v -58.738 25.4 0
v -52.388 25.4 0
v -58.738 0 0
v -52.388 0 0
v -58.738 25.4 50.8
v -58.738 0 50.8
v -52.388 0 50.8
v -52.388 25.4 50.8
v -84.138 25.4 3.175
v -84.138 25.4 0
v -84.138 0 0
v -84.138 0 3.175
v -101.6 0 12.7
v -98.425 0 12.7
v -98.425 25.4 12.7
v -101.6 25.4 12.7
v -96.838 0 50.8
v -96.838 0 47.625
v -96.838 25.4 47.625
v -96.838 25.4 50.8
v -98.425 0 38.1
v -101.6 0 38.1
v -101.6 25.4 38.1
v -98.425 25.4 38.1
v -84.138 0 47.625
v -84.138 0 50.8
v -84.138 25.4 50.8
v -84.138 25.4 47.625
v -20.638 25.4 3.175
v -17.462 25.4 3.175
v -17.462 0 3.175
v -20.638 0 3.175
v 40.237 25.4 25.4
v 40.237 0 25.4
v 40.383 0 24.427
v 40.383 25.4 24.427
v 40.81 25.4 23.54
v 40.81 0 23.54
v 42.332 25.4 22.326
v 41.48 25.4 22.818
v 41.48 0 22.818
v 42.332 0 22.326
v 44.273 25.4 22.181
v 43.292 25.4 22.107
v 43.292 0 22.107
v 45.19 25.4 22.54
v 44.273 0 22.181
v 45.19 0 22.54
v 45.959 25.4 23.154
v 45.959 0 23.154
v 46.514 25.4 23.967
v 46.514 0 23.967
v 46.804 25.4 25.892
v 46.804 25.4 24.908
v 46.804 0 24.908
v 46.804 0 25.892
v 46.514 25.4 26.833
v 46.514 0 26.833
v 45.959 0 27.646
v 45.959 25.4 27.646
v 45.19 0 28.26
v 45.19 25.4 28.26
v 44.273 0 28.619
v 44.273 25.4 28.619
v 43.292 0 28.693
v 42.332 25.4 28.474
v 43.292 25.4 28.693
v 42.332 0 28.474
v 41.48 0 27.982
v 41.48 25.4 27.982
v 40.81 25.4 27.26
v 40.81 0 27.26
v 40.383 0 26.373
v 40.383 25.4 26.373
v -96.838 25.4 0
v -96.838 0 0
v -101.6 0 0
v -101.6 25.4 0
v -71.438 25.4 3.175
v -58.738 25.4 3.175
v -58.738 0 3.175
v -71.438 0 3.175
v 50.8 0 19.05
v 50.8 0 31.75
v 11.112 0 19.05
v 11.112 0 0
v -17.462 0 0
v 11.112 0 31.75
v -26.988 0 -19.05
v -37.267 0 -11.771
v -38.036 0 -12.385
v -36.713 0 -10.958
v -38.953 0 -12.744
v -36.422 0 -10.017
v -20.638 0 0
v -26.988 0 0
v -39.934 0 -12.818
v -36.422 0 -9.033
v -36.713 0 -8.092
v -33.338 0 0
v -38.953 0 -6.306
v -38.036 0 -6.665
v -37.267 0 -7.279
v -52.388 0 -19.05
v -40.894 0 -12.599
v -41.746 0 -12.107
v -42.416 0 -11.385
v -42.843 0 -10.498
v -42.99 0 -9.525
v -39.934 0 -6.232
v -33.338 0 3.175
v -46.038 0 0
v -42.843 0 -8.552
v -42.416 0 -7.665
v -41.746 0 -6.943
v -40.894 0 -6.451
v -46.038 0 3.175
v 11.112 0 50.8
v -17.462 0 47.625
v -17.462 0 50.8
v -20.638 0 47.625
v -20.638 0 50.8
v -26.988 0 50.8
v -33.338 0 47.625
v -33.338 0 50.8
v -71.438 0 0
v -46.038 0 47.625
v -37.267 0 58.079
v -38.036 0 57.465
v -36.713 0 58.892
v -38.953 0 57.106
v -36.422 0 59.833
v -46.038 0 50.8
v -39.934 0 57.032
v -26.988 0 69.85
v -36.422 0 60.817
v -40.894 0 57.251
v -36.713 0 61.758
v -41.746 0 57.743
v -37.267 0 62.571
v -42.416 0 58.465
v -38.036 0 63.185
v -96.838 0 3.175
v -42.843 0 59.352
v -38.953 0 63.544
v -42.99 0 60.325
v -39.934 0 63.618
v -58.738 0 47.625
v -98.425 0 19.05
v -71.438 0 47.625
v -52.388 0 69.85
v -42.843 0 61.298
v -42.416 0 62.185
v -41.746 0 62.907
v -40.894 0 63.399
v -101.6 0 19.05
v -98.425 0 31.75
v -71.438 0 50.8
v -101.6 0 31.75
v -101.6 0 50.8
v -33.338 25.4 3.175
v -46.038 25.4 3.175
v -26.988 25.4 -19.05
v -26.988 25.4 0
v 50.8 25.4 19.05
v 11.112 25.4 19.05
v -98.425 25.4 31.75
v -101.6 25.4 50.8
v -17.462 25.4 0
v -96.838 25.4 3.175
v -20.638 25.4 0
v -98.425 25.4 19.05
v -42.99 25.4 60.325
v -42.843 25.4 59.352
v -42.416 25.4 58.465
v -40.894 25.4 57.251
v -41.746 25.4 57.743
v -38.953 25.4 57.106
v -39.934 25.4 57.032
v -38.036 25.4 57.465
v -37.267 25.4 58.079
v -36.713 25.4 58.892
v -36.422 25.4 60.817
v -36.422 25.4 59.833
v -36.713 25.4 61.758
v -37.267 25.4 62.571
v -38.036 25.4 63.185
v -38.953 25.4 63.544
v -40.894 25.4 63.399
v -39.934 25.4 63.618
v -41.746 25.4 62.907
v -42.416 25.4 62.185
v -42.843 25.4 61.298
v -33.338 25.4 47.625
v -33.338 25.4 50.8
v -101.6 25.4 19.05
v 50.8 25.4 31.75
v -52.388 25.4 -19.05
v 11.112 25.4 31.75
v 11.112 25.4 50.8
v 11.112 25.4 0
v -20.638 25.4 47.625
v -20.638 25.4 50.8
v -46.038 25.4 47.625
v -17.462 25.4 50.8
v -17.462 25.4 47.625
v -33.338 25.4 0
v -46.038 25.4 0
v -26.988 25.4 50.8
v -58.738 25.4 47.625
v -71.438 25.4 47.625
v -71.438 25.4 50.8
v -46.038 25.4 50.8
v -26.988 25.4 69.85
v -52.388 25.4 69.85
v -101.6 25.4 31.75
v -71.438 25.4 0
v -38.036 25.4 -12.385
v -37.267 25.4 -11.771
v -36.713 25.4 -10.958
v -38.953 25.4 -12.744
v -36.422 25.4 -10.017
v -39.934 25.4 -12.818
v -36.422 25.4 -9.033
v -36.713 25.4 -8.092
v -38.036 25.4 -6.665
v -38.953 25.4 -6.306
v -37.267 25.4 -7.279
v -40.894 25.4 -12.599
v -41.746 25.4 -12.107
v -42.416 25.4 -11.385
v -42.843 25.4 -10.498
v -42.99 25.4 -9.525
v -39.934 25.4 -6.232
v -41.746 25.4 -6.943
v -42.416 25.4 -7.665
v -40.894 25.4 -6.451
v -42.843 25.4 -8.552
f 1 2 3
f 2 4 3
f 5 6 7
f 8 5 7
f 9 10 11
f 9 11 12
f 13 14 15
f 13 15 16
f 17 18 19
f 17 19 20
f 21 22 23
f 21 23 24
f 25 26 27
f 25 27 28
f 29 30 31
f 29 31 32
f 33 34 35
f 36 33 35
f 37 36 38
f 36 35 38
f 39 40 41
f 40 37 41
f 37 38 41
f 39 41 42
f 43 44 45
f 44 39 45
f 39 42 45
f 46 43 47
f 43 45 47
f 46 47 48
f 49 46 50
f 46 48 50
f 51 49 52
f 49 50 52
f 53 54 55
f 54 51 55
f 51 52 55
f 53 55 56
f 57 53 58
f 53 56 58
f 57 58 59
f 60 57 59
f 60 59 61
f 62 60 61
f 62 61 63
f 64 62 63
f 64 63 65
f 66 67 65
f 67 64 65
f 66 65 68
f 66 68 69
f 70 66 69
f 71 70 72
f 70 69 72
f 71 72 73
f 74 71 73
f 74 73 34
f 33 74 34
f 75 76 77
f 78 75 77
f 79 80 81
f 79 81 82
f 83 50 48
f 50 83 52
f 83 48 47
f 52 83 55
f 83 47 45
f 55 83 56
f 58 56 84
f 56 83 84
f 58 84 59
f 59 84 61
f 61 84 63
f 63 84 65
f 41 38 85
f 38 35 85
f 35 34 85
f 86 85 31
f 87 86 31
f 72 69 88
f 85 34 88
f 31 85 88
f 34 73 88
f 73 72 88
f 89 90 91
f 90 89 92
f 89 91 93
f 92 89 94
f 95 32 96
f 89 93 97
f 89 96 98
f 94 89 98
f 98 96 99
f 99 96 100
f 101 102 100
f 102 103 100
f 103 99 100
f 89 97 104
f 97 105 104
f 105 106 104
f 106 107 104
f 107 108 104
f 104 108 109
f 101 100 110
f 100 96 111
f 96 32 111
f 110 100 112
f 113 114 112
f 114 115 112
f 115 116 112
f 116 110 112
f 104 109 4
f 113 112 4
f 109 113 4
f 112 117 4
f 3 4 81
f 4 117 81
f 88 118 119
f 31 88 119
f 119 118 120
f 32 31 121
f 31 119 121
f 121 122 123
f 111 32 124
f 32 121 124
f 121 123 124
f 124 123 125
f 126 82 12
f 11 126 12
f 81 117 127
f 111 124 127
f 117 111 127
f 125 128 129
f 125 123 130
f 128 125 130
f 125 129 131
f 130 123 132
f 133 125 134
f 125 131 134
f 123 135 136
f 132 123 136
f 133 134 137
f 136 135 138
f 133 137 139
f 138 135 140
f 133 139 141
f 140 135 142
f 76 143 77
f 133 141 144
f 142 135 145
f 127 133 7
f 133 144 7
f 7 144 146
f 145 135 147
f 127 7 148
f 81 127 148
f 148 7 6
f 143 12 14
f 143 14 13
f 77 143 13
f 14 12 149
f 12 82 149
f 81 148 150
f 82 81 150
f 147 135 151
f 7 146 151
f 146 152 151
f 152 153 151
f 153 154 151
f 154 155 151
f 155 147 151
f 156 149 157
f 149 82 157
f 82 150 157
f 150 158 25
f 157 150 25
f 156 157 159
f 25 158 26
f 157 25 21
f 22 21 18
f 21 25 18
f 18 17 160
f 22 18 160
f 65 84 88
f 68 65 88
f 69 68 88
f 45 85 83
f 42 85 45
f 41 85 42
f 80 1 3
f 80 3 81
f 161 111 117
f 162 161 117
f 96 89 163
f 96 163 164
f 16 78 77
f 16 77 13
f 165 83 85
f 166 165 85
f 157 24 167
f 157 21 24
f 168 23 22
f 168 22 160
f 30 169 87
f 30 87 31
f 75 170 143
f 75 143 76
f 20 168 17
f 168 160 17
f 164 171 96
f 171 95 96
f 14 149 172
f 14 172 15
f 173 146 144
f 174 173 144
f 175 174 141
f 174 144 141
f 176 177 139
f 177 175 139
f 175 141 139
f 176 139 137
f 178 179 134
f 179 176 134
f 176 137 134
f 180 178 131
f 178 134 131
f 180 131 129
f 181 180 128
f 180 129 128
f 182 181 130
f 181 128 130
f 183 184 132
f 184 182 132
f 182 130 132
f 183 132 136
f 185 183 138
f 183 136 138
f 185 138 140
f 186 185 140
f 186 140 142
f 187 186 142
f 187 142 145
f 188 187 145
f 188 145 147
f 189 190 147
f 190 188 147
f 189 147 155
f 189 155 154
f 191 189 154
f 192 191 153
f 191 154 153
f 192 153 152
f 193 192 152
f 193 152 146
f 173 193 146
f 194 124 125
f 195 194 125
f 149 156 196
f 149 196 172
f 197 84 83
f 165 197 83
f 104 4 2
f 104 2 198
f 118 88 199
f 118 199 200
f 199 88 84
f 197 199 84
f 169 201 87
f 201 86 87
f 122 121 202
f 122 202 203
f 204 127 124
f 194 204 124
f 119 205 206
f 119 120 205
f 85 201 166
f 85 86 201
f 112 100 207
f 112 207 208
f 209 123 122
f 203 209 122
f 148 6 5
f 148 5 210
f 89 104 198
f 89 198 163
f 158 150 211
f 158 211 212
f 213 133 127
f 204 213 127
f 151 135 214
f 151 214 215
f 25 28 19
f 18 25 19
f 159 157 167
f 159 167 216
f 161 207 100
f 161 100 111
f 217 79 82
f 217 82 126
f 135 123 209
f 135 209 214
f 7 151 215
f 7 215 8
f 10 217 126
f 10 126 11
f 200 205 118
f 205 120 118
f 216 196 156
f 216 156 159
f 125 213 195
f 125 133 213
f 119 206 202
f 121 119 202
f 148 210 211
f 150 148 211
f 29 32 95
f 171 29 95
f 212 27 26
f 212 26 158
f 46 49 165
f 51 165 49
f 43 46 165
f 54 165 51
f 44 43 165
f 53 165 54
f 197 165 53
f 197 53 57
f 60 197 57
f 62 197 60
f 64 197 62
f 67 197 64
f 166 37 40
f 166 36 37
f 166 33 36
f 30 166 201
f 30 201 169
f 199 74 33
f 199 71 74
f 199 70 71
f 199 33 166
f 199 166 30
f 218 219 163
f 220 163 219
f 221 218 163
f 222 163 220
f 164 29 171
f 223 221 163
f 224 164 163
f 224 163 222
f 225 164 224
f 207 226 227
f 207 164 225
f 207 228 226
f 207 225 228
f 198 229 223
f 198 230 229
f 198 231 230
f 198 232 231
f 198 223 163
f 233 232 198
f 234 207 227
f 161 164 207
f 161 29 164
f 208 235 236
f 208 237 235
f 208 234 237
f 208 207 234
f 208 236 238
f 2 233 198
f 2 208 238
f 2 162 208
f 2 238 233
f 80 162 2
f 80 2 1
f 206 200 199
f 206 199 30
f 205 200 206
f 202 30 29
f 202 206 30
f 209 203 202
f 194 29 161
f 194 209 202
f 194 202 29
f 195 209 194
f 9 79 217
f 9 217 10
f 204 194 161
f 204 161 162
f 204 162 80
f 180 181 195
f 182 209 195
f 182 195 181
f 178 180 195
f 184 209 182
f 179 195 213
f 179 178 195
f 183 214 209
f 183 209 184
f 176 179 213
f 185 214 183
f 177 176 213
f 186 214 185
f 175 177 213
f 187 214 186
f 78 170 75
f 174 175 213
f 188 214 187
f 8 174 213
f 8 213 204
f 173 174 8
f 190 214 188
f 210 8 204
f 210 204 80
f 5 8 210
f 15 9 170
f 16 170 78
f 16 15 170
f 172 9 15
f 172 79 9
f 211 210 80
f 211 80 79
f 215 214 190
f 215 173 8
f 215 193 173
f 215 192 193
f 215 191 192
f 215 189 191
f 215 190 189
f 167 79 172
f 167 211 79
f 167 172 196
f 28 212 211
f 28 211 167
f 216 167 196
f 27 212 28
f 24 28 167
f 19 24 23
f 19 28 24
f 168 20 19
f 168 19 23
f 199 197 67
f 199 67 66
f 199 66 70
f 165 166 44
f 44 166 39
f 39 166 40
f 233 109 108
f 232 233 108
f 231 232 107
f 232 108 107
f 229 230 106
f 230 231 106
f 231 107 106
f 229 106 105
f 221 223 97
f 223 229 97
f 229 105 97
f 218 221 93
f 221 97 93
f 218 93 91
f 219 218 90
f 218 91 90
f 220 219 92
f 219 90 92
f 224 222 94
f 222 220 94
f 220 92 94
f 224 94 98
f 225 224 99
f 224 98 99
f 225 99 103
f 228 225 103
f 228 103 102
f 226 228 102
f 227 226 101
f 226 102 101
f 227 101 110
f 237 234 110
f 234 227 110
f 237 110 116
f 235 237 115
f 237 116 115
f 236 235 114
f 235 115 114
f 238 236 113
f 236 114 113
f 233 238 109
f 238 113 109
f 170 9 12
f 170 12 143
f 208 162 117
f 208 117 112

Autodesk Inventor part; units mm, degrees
ref_plane "YZ Plane" through (0, 0, 0) normal (1, 0, 0) x (0, 1, 0)
ref_plane "XZ Plane" through (0, 0, 0) normal (0, 1, 0) x (-1, 0, 0)
ref_plane "XY Plane" through (0, 0, 0) normal (0, 0, 1) x (1, 0, 0)
sketch "Sketch1" plane through (0, 0, 0) normal (0, 1, 0) x (-1, 0, 0)
  line L0 (0, 0) -> (101.6, 0)
  line L1 (101.6, 0) -> (101.6, 50.8)
  line L2 (101.6, 50.8) -> (0, 50.8)
  line L3 (0, 50.8) -> (0, 0)
  line L4 (101.6, 0) -> (20.6375, 0)
  line L5 (20.6375, 50.8) -> (101.6, 50.8)
  line L6 (101.6, 50.8) -> (101.6, 0)
  line L7 (20.6375, 0) -> (0, 0)
  line L8 (0, 0) -> (0, 12.7)
  line L9 (0, 12.7) -> (20.6375, 12.7)
  line L10 (20.6375, 12.7) -> (20.6375, 0)
  line L11 (20.6375, 50.8) -> (0, 50.8)
  line L12 (0, 50.8) -> (0, 38.1)
  line L13 (0, 38.1) -> (20.6375, 38.1)
  line L14 (20.6375, 38.1) -> (20.6375, 50.8)
  line L15 (96.8375, 0) -> (84.1375, 0)
  line L16 (84.1375, 0) -> (84.1375, 3.175)
  line L17 (84.1375, 3.175) -> (96.8375, 3.175)
  line L18 (96.8375, 3.175) -> (96.8375, 0)
  line L19 (71.4375, 0) -> (58.7375, 0)
  line L20 (58.7375, 0) -> (58.7375, 3.175)
  line L21 (58.7375, 3.175) -> (71.4375, 3.175)
  line L22 (71.4375, 3.175) -> (71.4375, 0)
  line L23 (46.0375, 0) -> (33.3375, 0)
  line L24 (33.3375, 0) -> (33.3375, 3.175)
  line L25 (33.3375, 3.175) -> (46.0375, 3.175)
  line L26 (46.0375, 3.175) -> (46.0375, 0)
  line L27 (96.8375, 50.8) -> (84.1375, 50.8)
  line L28 (84.1375, 50.8) -> (84.1375, 47.625)
  line L29 (84.1375, 47.625) -> (96.8375, 47.625)
  line L30 (96.8375, 47.625) -> (96.8375, 50.8)
  line L31 (71.4375, 50.8) -> (58.7375, 50.8)
  line L32 (58.7375, 50.8) -> (58.7375, 47.625)
  line L33 (58.7375, 47.625) -> (71.4375, 47.625)
  line L34 (71.4375, 47.625) -> (71.4375, 50.8)
  line L35 (101.6, 38.1) -> (98.425, 38.1)
  line L36 (98.425, 38.1) -> (98.425, 31.75)
  line L37 (98.425, 31.75) -> (101.6, 31.75)
  line L38 (101.6, 31.75) -> (101.6, 38.1)
  line L39 (101.6, 19.05) -> (98.425, 19.05)
  line L40 (98.425, 19.05) -> (98.425, 12.7)
  line L41 (98.425, 12.7) -> (101.6, 12.7)
  line L42 (101.6, 12.7) -> (101.6, 19.05)
  line L43 (46.0375, 50.8) -> (46.0375, 47.625)
  line L44 (46.0375, 47.625) -> (33.3375, 47.625)
  line L45 (33.3375, 47.625) -> (33.3375, 50.8)
  line L46 (33.3375, 50.8) -> (46.0375, 50.8)
  line L47 (26.9875, 0) -> (52.3875, 0)
  line L48 (52.3875, 0) -> (52.3875, -19.05)
  line L49 (52.3875, -19.05) -> (26.9875, -19.05)
  line L50 (26.9875, -19.05) -> (26.9875, 0)
  line L51 (26.9875, 50.8) -> (26.9875, 69.85)
  line L52 (26.9875, 69.85) -> (52.3875, 69.85)
  line L53 (52.3875, 69.85) -> (52.3875, 50.8)
  line L54 (52.3875, 50.8) -> (26.9875, 50.8)
  circle A0 centre (39.6875, -9.525) radius 3.302
  circle A1 centre (39.6875, 60.325) radius 3.302
  line L55 (0, 19.05) -> (0, 31.75)
  line L56 (0, 31.75) -> (-50.8, 31.75)
  line L57 (-50.8, 31.75) -> (-50.8, 19.05)
  line L58 (-50.8, 19.05) -> (0, 19.05)
  circle A2 centre (-43.5387, 25.4) radius 3.302
  line L59 (26.9875, 50.8) -> (24.8905, 50.8)
  line L60 (26.9875, 0) -> (25.4, 0)
  line L61 (20.6375, 0) -> (17.4625, 0)
  line L62 (17.4625, 0) -> (17.4625, 3.175)
  line L63 (17.4625, 3.175) -> (20.6375, 3.175)
  line L64 (20.6375, 3.175) -> (20.6375, 0)
  line L65 (20.6375, 50.8) -> (17.4625, 50.8)
  line L66 (17.4625, 50.8) -> (17.4625, 47.625)
  line L67 (17.4625, 47.625) -> (20.6375, 47.625)
  line L68 (20.6375, 47.625) -> (20.6375, 50.8)
  line L69 (20.6375, 0) -> (-11.1125, 0)
  line L70 (-11.1125, 0) -> (-11.1125, 50.8)
  line L71 (-11.1125, 50.8) -> (20.6375, 50.8)
  line L72 (20.6375, 50.8) -> (20.6375, 0)
  point P0 (96.8375, 0)
  point P1 (96.8375, 50.8)
  point P2 (84.1375, 50.8)
  point P3 (71.4375, 50.8)
  point P4 (58.7375, 50.8)
  point P5 (46.0375, 50.8)
  point P6 (33.3375, 50.8)
  point P7 (33.3375, 0)
  point P8 (46.0375, 0)
  point P9 (58.7375, 0)
  point P10 (71.4375, 0)
  point P11 (84.1375, 0)
  point P12 (26.9875, 0)
  point P13 (52.3875, 0)
  point P14 (52.3875, 50.8)
  point P15 (26.9875, 50.8)
  point P16 (17.4625, 0)
  point P17 (0, 50.8)
  point P18 (-11.1125, 31.75)
  point P19 (-11.1125, 19.05)
  dimension "d56" = 101.6
  dimension "d57" = 50.8
  dimension "d59" = 50.8
  dimension "d60" = 12.7
  dimension "d61" = 12.7
  dimension "d62" = 12.7
  dimension "d63" = 3.175
  dimension "d64" = 12.7
  dimension "d65" = 3.175
  dimension "d66" = 12.7
  dimension "d67" = 4.7625
  dimension "d68" = 12.7
  dimension "d69" = 3.175
  dimension "d70" = 12.7
  dimension "d71" = 12.7
  dimension "d72" = 3.175
  dimension "d73" = 12.7
  dimension "d74" = 3.175
  dimension "d77" = 4.7625
  dimension "d78" = 12.7
  dimension "d79" = 3.175
  dimension "d80" = 6.35
  dimension "d81" = 12.7
  dimension "d82" = 3.175
  dimension "d83" = 6.35
  dimension "d84" = 12.7
  dimension "d86" = 44.45
  dimension "d89" = 3.175
  dimension "d90" = 12.7
  dimension "d91" = 12.7
  dimension "d94" = 25.4
  dimension "d99" = 25.4
  dimension "d116" = 6.604
  dimension "d117" = 9.525
  dimension "d118" = 6.604
  dimension "d119" = 9.525
  dimension "d122" = 9.525
  dimension "d123" = 9.525
  dimension "d128" = 12.7
  dimension "d129" = 50.8
  dimension "d130" = 6.604
  dimension "d131" = 6.35
  dimension "d132" = 12.7
  dimension "d134" = 12.7
  dimension "d141" = 25.4
  dimension "d144" = 6.35
  dimension "d145" = 6.35
  dimension "d147" = 3.175
  dimension "d148" = 3.175
  dimension "d149" = 3.175
  dimension "d150" = 3.175
  dimension "d151" = 12.7
  dimension "d152" = 12.7
  dimension "d155" = 31.75
extrude "Extrusion10" add sketch "Sketch1" along normal blind 25.4 contours L3 L9 L10 L63 L62 L0 | L69 L70 L58 L3 | L3 L13 L72 L9 | L10 L72 L14 L2 L45 L44 L43 L32 L33 L34 L28 L29 L30 L1 L35 L36 L37 L39 L40 L41 L0 L18 L17 L16 L22 L21 L20 L26 L25 L24 | L58 L70 L56 L3 | L58 L57 L56 L70 | L56 L70 L71 L3 | L13 L3 L2 L66 L67 L14 | L0 L48 L49 L50 | L51 L52 L53 L2
equation "\"BendRadius\" = Thickness"
equation "\"BendReliefWidth\" = Thickness"
equation "\"BendReliefDepth\" = 0.5 * Thickness"
equation "\"CornerReliefSize\" = 4 * Thickness"
equation "\"MinimumRemnant\" = 2 * Thickness"
equation "\"TransitionRadius\" = BendRadius"
equation "\"JacobiRadiusSize\" = BendRadius"
equation "\"GapSize\" = Thickness"
equation "\"Thickness\" = 3.048"
properties part number "v8_Burrow_Base_Detachable_EXT_LICK_SPOUT"
